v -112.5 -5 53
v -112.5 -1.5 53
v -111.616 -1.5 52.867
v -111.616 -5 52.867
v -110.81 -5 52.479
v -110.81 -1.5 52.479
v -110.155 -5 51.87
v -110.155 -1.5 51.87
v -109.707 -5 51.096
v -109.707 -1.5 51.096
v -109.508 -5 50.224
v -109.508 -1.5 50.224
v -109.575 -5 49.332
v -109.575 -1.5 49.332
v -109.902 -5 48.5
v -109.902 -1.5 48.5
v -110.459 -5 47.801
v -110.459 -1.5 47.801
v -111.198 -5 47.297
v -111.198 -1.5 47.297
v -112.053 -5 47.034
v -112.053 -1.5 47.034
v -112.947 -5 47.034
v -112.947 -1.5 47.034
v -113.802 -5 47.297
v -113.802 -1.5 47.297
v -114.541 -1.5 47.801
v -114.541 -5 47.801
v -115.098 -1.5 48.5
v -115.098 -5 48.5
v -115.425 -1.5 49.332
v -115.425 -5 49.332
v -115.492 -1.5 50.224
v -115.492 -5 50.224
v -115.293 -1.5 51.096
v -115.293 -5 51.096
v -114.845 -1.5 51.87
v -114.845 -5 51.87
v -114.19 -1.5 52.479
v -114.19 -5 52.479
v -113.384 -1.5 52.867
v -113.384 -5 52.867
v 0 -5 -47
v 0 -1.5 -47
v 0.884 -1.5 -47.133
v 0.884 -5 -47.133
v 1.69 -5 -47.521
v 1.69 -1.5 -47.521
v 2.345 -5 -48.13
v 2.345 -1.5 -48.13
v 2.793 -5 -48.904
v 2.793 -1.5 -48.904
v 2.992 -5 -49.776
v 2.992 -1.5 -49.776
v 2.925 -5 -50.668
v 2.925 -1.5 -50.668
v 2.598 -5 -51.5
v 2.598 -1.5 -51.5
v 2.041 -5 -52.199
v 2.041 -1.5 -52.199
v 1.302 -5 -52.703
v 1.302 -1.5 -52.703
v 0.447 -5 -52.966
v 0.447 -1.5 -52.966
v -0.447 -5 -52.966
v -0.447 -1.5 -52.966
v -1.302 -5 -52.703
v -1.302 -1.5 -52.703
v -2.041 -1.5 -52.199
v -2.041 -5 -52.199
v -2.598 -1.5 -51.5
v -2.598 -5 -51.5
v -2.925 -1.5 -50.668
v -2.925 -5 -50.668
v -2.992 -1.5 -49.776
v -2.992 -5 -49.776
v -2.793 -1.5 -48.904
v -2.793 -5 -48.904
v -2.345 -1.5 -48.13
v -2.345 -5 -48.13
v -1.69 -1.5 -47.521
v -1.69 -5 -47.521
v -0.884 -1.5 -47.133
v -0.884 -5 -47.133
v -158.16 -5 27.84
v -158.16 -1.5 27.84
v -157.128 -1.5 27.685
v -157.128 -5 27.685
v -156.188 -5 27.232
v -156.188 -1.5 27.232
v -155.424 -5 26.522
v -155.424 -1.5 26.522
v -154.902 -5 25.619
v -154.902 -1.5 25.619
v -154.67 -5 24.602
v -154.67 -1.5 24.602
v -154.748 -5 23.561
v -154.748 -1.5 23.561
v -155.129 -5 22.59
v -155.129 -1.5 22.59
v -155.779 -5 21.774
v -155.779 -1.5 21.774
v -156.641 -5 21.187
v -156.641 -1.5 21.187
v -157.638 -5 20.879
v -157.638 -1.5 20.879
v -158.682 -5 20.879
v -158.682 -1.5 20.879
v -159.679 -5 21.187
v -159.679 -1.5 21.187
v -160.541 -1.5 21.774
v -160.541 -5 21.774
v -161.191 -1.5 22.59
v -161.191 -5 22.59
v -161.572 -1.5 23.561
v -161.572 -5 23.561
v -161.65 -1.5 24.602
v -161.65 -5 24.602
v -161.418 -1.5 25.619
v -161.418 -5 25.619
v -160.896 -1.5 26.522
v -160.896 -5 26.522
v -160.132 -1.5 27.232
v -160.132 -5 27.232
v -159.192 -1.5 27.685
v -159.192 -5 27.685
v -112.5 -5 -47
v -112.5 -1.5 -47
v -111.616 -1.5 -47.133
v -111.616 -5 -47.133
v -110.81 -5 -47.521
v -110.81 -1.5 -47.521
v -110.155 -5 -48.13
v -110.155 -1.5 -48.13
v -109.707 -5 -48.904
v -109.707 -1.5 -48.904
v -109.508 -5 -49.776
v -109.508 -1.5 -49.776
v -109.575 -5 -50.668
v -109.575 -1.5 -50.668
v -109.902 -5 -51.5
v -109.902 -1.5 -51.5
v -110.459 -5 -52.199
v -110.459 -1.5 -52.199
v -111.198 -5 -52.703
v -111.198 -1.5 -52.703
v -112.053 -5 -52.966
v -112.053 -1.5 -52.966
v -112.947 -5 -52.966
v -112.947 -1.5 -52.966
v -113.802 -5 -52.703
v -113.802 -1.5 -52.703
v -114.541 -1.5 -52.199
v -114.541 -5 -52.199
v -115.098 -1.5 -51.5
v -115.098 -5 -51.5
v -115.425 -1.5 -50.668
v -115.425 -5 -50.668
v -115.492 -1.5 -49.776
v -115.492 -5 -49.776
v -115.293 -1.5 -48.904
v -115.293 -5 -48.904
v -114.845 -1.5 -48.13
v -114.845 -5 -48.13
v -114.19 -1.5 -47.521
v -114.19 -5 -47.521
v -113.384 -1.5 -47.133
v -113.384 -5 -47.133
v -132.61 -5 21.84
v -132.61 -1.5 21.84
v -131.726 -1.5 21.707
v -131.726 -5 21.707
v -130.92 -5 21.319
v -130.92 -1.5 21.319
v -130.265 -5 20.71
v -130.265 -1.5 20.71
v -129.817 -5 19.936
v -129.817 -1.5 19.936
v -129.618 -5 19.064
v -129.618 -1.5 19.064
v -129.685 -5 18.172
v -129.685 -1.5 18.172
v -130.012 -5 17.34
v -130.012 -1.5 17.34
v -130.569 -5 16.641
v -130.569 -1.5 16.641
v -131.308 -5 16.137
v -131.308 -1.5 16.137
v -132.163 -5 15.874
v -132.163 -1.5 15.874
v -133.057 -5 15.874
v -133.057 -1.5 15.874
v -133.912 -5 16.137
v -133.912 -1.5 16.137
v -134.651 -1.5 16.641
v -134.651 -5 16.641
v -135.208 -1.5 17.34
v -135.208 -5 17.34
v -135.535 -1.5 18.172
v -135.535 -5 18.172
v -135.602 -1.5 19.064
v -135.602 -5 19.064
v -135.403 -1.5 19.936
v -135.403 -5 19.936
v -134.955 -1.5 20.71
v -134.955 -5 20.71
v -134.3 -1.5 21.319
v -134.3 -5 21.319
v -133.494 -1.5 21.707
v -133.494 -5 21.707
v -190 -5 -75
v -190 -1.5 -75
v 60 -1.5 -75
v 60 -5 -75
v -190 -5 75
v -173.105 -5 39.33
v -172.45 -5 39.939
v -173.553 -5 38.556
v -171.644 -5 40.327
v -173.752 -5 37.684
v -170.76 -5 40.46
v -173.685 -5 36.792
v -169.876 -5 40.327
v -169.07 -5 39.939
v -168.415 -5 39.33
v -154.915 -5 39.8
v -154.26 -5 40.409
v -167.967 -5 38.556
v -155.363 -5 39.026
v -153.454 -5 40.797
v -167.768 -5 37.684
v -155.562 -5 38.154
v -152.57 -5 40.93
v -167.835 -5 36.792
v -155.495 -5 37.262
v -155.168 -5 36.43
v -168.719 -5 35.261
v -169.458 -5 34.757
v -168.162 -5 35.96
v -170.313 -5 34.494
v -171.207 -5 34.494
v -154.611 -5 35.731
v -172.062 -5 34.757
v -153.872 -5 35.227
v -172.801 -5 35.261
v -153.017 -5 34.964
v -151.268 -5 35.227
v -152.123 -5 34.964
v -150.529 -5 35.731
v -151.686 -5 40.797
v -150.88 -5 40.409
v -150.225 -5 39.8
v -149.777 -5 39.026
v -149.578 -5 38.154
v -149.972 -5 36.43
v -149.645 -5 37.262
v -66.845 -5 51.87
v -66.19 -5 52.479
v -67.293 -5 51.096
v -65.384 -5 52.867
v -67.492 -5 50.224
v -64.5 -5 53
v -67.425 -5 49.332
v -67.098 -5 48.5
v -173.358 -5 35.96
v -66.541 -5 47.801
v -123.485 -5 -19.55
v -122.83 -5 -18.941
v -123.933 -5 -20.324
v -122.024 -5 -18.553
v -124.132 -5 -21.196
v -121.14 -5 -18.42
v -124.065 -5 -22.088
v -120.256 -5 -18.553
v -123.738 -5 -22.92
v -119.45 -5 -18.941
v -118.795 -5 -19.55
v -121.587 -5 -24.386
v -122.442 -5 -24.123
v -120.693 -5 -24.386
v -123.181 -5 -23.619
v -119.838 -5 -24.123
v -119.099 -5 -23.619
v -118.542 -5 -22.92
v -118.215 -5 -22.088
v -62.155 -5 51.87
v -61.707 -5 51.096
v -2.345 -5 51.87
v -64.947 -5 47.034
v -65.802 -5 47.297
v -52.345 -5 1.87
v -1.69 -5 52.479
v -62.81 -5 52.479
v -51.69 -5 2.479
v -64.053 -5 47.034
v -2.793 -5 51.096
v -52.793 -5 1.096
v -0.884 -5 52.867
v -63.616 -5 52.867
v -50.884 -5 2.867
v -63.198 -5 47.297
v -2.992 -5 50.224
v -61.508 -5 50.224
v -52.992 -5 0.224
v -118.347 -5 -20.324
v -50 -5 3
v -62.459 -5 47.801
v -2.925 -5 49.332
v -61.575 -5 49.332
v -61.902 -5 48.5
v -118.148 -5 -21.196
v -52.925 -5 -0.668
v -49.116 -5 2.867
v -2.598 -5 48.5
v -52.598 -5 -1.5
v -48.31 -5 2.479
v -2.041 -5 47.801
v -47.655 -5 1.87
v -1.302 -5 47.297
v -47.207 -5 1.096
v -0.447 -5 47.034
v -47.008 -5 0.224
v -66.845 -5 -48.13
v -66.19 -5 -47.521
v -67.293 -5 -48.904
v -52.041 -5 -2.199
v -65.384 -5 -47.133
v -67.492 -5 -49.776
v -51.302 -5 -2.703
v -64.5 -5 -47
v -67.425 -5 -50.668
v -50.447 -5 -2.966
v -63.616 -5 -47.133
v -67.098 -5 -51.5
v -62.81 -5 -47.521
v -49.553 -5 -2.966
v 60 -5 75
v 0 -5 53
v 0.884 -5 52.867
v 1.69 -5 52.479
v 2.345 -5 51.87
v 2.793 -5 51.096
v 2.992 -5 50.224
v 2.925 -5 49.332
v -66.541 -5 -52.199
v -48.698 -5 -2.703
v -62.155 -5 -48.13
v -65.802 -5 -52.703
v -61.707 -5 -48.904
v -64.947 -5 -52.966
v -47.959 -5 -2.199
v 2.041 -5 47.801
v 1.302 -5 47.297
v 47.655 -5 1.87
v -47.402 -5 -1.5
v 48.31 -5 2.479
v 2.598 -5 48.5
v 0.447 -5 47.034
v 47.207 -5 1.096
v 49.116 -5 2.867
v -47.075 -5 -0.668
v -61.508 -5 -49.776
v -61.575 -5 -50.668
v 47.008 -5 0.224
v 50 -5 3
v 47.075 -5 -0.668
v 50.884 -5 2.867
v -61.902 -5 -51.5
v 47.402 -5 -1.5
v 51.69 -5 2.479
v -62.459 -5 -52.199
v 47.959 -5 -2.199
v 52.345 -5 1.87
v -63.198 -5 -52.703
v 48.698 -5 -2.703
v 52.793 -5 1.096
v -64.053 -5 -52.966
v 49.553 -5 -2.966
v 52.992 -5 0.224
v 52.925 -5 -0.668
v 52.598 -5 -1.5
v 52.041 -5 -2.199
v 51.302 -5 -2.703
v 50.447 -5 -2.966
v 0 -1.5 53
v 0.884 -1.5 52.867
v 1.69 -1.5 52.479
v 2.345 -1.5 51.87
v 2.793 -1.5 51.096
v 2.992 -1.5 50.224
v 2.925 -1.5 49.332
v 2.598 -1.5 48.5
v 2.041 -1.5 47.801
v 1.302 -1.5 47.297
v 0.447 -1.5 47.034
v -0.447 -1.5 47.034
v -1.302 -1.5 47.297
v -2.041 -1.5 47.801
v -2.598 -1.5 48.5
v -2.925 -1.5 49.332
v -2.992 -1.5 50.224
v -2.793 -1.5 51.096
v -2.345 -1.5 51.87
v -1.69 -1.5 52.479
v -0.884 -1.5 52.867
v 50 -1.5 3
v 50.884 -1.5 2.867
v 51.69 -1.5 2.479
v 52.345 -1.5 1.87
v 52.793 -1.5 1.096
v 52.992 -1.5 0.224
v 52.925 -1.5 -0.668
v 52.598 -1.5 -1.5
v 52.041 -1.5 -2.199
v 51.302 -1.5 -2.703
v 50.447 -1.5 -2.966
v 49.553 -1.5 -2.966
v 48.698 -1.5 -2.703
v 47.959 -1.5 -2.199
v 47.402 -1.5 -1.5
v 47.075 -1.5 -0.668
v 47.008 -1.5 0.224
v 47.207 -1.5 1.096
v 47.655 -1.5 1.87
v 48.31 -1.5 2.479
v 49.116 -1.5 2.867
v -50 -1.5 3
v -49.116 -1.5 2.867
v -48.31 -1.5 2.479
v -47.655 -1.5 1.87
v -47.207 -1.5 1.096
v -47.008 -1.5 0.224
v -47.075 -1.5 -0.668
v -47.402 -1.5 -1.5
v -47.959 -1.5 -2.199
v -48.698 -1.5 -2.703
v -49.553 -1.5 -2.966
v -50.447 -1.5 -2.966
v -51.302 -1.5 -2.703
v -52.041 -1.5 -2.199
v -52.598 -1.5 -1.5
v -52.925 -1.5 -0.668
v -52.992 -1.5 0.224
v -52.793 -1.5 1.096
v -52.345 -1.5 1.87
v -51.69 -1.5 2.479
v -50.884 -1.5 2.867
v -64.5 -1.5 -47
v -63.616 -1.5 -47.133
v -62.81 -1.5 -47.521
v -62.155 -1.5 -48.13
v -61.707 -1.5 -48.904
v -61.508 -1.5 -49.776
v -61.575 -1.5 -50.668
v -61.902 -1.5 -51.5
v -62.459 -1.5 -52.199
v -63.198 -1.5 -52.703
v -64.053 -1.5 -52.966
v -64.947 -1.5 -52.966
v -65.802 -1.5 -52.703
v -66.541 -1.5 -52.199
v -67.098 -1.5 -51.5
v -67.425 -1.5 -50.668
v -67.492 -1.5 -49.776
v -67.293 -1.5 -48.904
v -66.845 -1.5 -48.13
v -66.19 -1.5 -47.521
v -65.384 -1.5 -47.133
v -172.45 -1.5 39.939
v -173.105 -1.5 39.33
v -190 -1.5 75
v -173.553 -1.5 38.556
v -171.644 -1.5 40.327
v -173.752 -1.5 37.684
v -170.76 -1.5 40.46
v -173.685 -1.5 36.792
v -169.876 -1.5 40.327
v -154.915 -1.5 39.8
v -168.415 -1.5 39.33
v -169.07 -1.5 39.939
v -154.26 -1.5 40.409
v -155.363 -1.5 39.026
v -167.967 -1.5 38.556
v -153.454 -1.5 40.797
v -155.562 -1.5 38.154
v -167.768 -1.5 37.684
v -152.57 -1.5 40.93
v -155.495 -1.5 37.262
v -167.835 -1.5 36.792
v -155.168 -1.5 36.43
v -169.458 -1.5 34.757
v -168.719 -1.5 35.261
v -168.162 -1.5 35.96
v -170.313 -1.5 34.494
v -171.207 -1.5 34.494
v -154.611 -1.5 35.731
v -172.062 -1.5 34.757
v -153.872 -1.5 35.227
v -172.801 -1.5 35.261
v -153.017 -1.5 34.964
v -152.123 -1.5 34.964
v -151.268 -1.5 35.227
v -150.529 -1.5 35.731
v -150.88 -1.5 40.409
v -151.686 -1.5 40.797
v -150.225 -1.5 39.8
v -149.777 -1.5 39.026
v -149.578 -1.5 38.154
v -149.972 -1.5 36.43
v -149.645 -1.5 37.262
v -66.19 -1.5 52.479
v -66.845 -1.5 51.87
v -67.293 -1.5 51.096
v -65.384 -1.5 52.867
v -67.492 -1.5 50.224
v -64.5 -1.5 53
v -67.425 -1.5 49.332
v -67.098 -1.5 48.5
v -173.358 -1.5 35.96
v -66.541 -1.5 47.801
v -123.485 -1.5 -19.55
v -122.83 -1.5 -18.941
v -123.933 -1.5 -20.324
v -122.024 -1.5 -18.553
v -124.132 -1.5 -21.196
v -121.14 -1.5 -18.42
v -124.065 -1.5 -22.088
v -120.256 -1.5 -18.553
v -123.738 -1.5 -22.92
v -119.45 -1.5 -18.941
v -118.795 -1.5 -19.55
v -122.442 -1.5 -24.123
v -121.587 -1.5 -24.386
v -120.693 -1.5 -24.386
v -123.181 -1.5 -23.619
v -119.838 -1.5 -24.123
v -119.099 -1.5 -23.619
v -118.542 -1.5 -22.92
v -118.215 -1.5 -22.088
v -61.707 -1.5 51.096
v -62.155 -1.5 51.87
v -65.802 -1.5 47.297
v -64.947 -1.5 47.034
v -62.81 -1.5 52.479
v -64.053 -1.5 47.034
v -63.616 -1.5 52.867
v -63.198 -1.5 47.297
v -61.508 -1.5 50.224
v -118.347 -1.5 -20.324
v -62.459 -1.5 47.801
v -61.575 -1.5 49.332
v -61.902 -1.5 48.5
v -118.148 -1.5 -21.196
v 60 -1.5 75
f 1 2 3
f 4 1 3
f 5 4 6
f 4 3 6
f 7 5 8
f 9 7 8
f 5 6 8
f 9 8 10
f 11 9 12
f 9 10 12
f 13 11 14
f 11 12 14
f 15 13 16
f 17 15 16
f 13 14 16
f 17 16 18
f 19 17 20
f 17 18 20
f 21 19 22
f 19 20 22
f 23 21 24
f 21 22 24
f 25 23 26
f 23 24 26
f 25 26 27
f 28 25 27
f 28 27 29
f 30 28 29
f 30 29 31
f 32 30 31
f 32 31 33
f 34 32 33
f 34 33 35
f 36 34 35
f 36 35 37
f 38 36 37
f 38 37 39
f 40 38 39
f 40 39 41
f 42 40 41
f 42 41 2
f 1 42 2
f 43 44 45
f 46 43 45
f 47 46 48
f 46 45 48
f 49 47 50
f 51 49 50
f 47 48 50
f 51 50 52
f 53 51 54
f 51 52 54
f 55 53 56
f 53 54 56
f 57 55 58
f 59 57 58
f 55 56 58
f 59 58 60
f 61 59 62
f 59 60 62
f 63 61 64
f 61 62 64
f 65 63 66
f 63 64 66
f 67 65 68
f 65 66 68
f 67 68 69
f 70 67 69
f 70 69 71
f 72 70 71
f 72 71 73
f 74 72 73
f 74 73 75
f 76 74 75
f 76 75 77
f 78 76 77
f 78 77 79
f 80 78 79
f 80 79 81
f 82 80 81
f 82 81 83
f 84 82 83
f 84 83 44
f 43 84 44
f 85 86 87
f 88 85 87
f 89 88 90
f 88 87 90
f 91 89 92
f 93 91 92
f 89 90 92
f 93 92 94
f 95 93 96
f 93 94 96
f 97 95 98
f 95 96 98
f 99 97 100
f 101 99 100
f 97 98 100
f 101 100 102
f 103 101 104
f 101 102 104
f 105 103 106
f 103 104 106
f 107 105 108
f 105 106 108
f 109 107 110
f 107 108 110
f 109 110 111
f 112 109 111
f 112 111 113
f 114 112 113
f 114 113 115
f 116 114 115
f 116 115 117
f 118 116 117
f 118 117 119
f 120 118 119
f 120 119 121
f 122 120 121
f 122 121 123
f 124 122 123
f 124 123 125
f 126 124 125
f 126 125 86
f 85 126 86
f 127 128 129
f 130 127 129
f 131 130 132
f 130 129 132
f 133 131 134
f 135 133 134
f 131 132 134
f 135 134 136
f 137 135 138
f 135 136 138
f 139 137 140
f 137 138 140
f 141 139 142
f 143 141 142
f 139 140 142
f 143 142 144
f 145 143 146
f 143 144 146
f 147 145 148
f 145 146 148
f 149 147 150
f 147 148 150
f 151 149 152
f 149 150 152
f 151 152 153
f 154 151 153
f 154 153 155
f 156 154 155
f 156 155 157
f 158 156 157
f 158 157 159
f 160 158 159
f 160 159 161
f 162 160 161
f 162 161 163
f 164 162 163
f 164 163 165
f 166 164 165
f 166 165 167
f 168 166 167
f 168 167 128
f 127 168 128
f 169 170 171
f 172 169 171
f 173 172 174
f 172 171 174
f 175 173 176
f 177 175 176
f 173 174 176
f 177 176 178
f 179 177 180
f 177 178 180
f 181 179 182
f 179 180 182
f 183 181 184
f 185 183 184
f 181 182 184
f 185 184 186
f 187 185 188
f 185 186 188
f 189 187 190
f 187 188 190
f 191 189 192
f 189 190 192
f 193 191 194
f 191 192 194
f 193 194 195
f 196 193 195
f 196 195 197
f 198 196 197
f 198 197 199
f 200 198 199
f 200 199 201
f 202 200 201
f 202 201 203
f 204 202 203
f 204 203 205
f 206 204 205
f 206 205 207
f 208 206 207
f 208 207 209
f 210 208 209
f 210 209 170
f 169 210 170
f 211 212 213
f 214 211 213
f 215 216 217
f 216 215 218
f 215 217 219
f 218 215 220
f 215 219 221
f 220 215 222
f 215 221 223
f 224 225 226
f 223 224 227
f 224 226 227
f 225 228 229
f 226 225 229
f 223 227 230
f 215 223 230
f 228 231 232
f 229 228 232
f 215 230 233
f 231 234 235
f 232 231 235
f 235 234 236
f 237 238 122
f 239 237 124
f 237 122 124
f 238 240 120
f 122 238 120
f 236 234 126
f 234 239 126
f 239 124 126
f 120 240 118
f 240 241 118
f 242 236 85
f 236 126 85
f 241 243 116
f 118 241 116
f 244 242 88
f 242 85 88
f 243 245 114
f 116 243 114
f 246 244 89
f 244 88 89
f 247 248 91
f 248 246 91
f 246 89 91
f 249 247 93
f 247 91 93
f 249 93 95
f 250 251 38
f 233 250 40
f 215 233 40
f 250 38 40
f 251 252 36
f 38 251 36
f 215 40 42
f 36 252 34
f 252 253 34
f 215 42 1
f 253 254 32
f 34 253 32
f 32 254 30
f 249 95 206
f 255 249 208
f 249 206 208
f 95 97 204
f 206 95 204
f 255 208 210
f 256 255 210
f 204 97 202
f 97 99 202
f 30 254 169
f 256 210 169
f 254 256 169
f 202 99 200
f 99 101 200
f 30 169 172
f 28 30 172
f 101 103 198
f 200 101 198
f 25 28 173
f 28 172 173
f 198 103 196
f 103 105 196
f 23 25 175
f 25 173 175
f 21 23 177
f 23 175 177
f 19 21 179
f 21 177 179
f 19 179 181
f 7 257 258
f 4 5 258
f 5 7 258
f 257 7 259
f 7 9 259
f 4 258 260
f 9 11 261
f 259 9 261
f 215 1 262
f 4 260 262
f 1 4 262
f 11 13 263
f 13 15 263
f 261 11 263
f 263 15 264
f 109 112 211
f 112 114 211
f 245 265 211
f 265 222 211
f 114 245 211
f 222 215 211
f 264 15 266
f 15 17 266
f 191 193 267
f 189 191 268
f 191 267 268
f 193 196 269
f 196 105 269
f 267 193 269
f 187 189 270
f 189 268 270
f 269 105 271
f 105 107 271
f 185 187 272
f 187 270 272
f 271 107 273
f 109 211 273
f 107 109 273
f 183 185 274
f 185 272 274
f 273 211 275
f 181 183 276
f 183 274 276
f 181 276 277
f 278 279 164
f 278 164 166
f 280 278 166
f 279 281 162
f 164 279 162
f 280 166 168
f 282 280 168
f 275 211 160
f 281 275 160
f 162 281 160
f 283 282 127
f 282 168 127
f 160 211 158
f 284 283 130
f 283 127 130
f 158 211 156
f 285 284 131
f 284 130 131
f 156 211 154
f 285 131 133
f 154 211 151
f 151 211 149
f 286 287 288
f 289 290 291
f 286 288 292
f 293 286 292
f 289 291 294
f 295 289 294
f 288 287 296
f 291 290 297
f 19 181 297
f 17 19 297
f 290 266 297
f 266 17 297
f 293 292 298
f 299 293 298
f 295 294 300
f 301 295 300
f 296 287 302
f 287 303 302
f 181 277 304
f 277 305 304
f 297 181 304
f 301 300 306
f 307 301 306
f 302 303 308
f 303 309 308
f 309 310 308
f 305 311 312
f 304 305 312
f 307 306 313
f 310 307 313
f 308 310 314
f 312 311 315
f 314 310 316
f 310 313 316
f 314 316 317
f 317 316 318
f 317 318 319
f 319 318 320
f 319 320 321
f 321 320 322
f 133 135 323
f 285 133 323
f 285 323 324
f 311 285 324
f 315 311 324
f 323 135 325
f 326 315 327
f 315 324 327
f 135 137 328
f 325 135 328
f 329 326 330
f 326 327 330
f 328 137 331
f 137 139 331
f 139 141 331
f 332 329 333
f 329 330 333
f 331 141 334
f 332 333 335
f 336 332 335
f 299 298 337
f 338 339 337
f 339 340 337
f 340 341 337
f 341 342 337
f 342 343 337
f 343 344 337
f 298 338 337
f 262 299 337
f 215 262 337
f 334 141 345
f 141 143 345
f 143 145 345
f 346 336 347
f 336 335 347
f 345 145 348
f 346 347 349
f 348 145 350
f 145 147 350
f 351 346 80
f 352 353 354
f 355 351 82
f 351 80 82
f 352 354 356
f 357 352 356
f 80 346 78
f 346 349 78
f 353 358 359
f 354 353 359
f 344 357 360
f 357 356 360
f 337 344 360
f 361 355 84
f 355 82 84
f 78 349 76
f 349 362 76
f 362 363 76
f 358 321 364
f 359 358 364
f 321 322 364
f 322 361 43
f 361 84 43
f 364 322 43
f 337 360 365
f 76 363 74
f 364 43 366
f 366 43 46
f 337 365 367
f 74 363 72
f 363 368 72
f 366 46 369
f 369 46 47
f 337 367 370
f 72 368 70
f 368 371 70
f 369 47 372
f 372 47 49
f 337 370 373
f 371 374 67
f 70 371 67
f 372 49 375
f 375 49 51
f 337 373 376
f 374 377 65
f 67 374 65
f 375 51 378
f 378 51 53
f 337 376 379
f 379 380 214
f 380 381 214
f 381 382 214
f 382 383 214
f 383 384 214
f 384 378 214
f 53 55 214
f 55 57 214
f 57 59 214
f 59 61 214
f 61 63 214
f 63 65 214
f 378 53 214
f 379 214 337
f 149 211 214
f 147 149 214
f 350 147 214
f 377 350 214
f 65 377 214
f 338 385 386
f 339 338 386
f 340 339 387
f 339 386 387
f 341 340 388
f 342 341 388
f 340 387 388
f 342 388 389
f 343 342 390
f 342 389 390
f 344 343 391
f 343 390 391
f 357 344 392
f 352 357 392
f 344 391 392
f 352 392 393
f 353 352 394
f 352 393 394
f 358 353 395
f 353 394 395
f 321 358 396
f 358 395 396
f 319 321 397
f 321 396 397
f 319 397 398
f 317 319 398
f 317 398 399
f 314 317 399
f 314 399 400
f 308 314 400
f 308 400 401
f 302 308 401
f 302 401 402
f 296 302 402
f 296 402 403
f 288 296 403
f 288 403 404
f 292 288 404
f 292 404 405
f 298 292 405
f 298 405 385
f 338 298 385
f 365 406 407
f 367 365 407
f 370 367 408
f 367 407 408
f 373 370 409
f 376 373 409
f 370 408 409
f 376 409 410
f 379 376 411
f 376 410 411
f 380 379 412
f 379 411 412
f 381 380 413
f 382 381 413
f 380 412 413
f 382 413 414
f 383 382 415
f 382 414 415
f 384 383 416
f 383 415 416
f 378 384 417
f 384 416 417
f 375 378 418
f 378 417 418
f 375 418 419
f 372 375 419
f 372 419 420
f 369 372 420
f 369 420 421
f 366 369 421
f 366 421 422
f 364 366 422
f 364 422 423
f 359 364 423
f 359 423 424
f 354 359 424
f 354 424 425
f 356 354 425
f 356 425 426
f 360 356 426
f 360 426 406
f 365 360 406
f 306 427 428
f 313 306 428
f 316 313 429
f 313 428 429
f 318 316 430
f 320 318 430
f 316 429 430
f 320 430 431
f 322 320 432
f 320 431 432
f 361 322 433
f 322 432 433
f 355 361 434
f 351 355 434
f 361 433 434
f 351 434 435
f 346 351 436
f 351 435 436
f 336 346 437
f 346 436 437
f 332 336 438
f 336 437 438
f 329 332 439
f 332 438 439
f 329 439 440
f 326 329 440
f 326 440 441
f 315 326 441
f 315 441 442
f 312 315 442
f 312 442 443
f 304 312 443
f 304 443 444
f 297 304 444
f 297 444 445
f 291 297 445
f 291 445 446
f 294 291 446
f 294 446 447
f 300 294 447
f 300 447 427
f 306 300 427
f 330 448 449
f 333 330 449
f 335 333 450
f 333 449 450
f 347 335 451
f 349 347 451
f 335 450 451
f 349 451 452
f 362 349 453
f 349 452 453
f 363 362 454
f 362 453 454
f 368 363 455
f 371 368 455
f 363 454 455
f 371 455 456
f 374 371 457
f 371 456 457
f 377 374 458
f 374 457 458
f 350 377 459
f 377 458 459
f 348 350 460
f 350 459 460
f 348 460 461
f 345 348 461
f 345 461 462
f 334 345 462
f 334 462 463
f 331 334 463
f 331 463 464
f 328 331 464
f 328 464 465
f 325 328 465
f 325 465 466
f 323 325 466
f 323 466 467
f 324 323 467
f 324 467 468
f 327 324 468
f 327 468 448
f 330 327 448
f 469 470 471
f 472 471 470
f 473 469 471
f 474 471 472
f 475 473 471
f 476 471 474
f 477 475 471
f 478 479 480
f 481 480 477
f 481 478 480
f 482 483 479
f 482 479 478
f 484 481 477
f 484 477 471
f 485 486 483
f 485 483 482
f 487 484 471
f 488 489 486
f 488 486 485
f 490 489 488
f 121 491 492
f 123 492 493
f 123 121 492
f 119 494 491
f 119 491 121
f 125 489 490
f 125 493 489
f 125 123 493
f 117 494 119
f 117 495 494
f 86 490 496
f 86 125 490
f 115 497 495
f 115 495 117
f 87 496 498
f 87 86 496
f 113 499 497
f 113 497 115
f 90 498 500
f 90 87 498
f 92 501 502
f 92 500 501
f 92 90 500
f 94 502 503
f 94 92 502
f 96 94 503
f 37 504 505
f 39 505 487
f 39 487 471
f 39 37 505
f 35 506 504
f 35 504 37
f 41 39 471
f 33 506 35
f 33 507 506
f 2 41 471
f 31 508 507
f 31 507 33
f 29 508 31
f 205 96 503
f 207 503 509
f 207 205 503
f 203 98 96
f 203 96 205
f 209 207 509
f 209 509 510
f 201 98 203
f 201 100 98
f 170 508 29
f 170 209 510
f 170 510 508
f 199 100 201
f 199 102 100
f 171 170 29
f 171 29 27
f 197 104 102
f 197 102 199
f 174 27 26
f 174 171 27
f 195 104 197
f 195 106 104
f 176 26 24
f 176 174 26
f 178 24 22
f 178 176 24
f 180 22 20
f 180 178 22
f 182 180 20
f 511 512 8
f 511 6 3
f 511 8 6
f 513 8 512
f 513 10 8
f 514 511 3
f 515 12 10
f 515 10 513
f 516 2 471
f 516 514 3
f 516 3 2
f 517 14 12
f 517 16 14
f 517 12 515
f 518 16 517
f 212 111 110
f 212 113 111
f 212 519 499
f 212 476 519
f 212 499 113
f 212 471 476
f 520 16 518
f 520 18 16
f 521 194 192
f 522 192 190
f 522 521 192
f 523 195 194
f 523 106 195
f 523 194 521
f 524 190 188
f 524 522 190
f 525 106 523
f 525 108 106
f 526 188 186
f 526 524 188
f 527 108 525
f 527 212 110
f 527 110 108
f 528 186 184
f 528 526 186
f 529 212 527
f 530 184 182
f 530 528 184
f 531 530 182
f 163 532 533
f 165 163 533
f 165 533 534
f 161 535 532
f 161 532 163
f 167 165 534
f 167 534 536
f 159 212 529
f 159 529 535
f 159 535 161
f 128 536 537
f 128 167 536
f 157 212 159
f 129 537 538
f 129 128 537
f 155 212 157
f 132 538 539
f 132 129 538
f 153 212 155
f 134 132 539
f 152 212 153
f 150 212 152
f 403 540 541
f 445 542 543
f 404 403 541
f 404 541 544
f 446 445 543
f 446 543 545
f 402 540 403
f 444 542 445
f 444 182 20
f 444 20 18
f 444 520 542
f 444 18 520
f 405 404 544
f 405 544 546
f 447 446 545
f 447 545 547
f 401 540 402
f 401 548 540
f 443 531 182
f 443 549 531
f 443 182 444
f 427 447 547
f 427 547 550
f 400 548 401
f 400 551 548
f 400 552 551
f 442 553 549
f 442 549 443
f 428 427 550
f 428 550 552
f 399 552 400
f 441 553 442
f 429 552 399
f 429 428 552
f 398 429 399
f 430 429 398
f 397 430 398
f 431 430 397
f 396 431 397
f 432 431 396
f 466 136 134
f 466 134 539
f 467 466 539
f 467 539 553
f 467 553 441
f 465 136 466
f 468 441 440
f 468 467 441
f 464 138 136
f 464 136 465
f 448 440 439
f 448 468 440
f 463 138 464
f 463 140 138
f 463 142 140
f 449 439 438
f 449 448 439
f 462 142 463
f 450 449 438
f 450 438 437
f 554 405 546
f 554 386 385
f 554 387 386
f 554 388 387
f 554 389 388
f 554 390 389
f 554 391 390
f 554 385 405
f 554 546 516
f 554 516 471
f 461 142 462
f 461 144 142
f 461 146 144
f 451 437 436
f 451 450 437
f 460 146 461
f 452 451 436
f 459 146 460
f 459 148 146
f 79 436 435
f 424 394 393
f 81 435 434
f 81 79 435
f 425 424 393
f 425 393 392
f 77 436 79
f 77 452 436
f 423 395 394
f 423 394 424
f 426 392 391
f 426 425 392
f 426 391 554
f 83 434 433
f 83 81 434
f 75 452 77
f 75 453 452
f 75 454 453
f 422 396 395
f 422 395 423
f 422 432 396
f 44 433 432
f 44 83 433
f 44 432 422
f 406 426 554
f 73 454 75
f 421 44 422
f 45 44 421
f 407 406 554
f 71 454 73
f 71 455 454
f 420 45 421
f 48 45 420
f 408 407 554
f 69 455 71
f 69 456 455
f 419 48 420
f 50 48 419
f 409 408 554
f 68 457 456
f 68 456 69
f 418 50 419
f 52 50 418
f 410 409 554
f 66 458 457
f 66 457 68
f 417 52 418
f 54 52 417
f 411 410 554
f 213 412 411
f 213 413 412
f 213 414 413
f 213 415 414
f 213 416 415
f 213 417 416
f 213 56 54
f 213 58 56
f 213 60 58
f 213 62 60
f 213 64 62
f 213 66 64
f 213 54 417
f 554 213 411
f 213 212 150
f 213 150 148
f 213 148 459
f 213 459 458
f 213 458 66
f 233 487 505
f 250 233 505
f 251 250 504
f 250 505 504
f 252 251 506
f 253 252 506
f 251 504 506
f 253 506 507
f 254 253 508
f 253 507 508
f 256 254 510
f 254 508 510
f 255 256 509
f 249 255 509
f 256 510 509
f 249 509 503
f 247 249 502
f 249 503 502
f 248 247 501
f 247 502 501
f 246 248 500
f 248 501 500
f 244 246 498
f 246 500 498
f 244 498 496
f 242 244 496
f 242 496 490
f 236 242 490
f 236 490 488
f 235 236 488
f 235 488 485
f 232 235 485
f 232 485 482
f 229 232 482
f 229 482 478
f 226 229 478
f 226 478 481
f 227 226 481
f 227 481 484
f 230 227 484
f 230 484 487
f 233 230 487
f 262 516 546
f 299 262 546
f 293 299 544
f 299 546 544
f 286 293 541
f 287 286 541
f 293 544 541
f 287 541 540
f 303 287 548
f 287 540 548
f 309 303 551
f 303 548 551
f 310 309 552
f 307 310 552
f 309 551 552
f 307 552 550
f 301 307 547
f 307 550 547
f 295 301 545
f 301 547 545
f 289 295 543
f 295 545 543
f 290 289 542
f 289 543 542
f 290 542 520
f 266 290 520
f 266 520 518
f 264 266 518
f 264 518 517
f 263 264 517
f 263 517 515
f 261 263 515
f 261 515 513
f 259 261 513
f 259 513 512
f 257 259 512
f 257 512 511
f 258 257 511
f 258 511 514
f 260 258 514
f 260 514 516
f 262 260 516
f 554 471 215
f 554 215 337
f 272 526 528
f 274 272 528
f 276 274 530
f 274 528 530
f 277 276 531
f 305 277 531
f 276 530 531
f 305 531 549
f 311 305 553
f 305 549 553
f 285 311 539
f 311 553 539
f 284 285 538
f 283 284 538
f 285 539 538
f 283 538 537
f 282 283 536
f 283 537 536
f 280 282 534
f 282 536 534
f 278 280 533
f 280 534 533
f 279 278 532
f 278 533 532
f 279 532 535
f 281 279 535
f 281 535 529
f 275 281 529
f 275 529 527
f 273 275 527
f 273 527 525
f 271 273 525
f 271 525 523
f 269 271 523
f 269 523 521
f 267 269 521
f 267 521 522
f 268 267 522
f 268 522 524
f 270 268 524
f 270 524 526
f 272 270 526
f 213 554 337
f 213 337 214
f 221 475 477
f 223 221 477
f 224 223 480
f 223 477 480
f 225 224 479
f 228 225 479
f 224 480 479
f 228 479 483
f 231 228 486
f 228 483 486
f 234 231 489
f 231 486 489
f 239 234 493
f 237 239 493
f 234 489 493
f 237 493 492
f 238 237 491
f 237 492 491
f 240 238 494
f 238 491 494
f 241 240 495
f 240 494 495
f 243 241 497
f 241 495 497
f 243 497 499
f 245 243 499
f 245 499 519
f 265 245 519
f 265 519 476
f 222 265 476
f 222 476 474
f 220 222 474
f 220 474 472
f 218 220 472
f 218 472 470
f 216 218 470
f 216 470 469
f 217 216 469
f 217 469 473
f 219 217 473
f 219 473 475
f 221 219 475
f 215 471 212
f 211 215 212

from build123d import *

# Parameters (mm, degrees)
SKETCH_1_W           = 250
SKETCH_1_H           = 150
EXTRUDE_1_DEPTH      = 5
SKETCH_1_4_R         = 3
CUT_EXTRUDE_1_DEPTH  = 5
SKETCH_1_5_R         = 3
CUT_EXTRUDE_2_DEPTH  = 5
SKETCH_1_6_R         = 3
CUT_EXTRUDE_3_DEPTH  = 5
SKETCH_1_7_R         = 3
CUT_EXTRUDE_4_DEPTH  = 5
SKETCH_2_R           = 3
CUT_EXTRUDE_5_DEPTH  = 5
SKETCH_3_R           = 3
CUT_EXTRUDE_6_DEPTH  = 45
SKETCH_3_3_R         = 3.5
CUT_EXTRUDE_7_DEPTH  = 45
SKETCH_4_R           = 3
CUT_EXTRUDE_8_DEPTH  = 5
SKETCH_4_3_R         = 3
CUT_EXTRUDE_9_DEPTH  = 5
SKETCH_5_R           = 3
CUT_EXTRUDE_10_DEPTH = 5
SKETCH_6_W           = 250
SKETCH_6_H           = 150
SKETCH_6_R           = 3
SKETCH_6_R_2         = 3.5
CUT_EXTRUDE_11_DEPTH = 1.5
SKETCH_7_R           = 3
CUT_EXTRUDE_12_DEPTH = 205.296965225


with BuildPart() as part:
    # 草圖1 → 填料-伸長1 (new body)
    with BuildSketch(Plane(origin=(0, 0, 0), x_dir=(1, 0, 0), z_dir=(0, 1, 0))):
        with Locations((-65, 0)):
            Rectangle(SKETCH_1_W, SKETCH_1_H)
    extrude(amount=-EXTRUDE_1_DEPTH)

    # 草圖1<4> → 除料-伸長1 (cut)
    with BuildSketch(Plane(origin=(0, 0, 0), x_dir=(1, 0, 0), z_dir=(0, 1, 0))):
        with Locations((0, 50)):
            Circle(SKETCH_1_4_R)
    extrude(amount=-CUT_EXTRUDE_1_DEPTH, mode=Mode.SUBTRACT)

    # 草圖1<5> → 除料-伸長2 (cut)
    with BuildSketch(Plane(origin=(0, 0, 0), x_dir=(1, 0, 0), z_dir=(0, 1, 0))):
        with Locations((-50, 0)):
            Circle(SKETCH_1_5_R)
    extrude(amount=-CUT_EXTRUDE_2_DEPTH, mode=Mode.SUBTRACT)

    # 草圖1<6> → 除料-伸長3 (cut)
    with BuildSketch(Plane(origin=(0, 0, 0), x_dir=(1, 0, 0), z_dir=(0, 1, 0))):
        with Locations((0, -50)):
            Circle(SKETCH_1_6_R)
    extrude(amount=-CUT_EXTRUDE_3_DEPTH, mode=Mode.SUBTRACT)

    # 草圖1<7> → 除料-伸長4 (cut)
    with BuildSketch(Plane(origin=(0, 0, 0), x_dir=(1, 0, 0), z_dir=(0, 1, 0))):
        with Locations((50, 0)):
            Circle(SKETCH_1_7_R)
    extrude(amount=-CUT_EXTRUDE_4_DEPTH, mode=Mode.SUBTRACT)

    # 草圖2 → 除料-伸長5 (cut)
    with BuildSketch(Plane(origin=(0, 0, 0), x_dir=(1, 0, 0), z_dir=(0, 1, 0))):
        with Locations((-170.76, -37.46)):
            Circle(SKETCH_2_R)
    extrude(amount=-CUT_EXTRUDE_5_DEPTH, mode=Mode.SUBTRACT)

    # 草圖3 → 除料-伸長6 (cut)
    with BuildSketch(Plane(origin=(0, 0, 0), x_dir=(1, 0, 0), z_dir=(0, 1, 0))):
        with Locations((-152.57, -37.93)):
            Circle(SKETCH_3_R)
    extrude(amount=-CUT_EXTRUDE_6_DEPTH, mode=Mode.SUBTRACT)

    # 草圖3<3> → 除料-伸長7 (cut)
    with BuildSketch(Plane(origin=(0, 0, 0), x_dir=(1, 0, 0), z_dir=(0, 1, 0))):
        with Locations((-158.16, -24.34)):
            Circle(SKETCH_3_3_R)
    extrude(amount=-CUT_EXTRUDE_7_DEPTH, mode=Mode.SUBTRACT)

    # 草圖4 → 除料-伸長8 (cut)
    with BuildSketch(Plane(origin=(0, 0, 0), x_dir=(1, 0, 0), z_dir=(0, 1, 0))):
        with Locations((-112.5, -50)):
            Circle(SKETCH_4_R)
    extrude(amount=-CUT_EXTRUDE_8_DEPTH, mode=Mode.SUBTRACT)

    # 草圖4<3> → 除料-伸長9 (cut)
    with BuildSketch(Plane(origin=(0, 0, 0), x_dir=(1, 0, 0), z_dir=(0, 1, 0))):
        with Locations((-64.5, -50)):
            Circle(SKETCH_4_3_R)
    extrude(amount=-CUT_EXTRUDE_9_DEPTH, mode=Mode.SUBTRACT)

    # 草圖5 → 除料-伸長10 (cut)
    with BuildSketch(Plane(origin=(0, 0, 0), x_dir=(1, 0, 0), z_dir=(0, 1, 0))):
        with Locations((-132.61, -18.84)):
            Circle(SKETCH_5_R)
        with Locations((-121.14, 21.42)):
            Circle(SKETCH_5_R)
    extrude(amount=-CUT_EXTRUDE_10_DEPTH, mode=Mode.SUBTRACT)

    # 草圖6 → 除料-伸長11 (cut)
    with BuildSketch(Plane(origin=(0, 0, 0), x_dir=(1, 0, 0), z_dir=(0, 1, 0))):
        with Locations((-65, 0)):
            Rectangle(SKETCH_6_W, SKETCH_6_H)
        with Locations((-170.76, -37.46)):
            Circle(SKETCH_6_R, mode=Mode.SUBTRACT)
        with Locations((-158.16, -24.34)):
            Circle(SKETCH_6_R_2, mode=Mode.SUBTRACT)
        with Locations((-152.57, -37.93)):
            Circle(SKETCH_6_R, mode=Mode.SUBTRACT)
        with Locations((-132.61, -18.84)):
            Circle(SKETCH_6_R, mode=Mode.SUBTRACT)
        with Locations((-112.5, -50)):
            Circle(SKETCH_6_R, mode=Mode.SUBTRACT)
        with Locations((-121.14, 21.42)):
            Circle(SKETCH_6_R, mode=Mode.SUBTRACT)
        with Locations((-50, 0)):
            Circle(SKETCH_6_R, mode=Mode.SUBTRACT)
        with Locations((-64.5, -50)):
            Circle(SKETCH_6_R, mode=Mode.SUBTRACT)
        with Locations((0, 50)):
            Circle(SKETCH_6_R, mode=Mode.SUBTRACT)
        with Locations((0, -50)):
            Circle(SKETCH_6_R, mode=Mode.SUBTRACT)
        with Locations((50, 0)):
            Circle(SKETCH_6_R, mode=Mode.SUBTRACT)
    extrude(amount=-CUT_EXTRUDE_11_DEPTH, mode=Mode.SUBTRACT)

    # 草圖7 → 除料-伸長12 (cut, through all)
    with BuildSketch(Plane(origin=(0, -1.5, 0), x_dir=(1, 0, 0), z_dir=(0, 1, 0))):
        with Locations((-64.5, 50)):
            Circle(SKETCH_7_R)
        with Locations((-112.5, 50)):
            Circle(SKETCH_7_R)
        with Locations((-64.5, -50)):
            Circle(SKETCH_7_R)
        with Locations((-112.5, -50)):
            Circle(SKETCH_7_R)
    extrude(amount=-CUT_EXTRUDE_12_DEPTH, mode=Mode.SUBTRACT)


solid = part.part
